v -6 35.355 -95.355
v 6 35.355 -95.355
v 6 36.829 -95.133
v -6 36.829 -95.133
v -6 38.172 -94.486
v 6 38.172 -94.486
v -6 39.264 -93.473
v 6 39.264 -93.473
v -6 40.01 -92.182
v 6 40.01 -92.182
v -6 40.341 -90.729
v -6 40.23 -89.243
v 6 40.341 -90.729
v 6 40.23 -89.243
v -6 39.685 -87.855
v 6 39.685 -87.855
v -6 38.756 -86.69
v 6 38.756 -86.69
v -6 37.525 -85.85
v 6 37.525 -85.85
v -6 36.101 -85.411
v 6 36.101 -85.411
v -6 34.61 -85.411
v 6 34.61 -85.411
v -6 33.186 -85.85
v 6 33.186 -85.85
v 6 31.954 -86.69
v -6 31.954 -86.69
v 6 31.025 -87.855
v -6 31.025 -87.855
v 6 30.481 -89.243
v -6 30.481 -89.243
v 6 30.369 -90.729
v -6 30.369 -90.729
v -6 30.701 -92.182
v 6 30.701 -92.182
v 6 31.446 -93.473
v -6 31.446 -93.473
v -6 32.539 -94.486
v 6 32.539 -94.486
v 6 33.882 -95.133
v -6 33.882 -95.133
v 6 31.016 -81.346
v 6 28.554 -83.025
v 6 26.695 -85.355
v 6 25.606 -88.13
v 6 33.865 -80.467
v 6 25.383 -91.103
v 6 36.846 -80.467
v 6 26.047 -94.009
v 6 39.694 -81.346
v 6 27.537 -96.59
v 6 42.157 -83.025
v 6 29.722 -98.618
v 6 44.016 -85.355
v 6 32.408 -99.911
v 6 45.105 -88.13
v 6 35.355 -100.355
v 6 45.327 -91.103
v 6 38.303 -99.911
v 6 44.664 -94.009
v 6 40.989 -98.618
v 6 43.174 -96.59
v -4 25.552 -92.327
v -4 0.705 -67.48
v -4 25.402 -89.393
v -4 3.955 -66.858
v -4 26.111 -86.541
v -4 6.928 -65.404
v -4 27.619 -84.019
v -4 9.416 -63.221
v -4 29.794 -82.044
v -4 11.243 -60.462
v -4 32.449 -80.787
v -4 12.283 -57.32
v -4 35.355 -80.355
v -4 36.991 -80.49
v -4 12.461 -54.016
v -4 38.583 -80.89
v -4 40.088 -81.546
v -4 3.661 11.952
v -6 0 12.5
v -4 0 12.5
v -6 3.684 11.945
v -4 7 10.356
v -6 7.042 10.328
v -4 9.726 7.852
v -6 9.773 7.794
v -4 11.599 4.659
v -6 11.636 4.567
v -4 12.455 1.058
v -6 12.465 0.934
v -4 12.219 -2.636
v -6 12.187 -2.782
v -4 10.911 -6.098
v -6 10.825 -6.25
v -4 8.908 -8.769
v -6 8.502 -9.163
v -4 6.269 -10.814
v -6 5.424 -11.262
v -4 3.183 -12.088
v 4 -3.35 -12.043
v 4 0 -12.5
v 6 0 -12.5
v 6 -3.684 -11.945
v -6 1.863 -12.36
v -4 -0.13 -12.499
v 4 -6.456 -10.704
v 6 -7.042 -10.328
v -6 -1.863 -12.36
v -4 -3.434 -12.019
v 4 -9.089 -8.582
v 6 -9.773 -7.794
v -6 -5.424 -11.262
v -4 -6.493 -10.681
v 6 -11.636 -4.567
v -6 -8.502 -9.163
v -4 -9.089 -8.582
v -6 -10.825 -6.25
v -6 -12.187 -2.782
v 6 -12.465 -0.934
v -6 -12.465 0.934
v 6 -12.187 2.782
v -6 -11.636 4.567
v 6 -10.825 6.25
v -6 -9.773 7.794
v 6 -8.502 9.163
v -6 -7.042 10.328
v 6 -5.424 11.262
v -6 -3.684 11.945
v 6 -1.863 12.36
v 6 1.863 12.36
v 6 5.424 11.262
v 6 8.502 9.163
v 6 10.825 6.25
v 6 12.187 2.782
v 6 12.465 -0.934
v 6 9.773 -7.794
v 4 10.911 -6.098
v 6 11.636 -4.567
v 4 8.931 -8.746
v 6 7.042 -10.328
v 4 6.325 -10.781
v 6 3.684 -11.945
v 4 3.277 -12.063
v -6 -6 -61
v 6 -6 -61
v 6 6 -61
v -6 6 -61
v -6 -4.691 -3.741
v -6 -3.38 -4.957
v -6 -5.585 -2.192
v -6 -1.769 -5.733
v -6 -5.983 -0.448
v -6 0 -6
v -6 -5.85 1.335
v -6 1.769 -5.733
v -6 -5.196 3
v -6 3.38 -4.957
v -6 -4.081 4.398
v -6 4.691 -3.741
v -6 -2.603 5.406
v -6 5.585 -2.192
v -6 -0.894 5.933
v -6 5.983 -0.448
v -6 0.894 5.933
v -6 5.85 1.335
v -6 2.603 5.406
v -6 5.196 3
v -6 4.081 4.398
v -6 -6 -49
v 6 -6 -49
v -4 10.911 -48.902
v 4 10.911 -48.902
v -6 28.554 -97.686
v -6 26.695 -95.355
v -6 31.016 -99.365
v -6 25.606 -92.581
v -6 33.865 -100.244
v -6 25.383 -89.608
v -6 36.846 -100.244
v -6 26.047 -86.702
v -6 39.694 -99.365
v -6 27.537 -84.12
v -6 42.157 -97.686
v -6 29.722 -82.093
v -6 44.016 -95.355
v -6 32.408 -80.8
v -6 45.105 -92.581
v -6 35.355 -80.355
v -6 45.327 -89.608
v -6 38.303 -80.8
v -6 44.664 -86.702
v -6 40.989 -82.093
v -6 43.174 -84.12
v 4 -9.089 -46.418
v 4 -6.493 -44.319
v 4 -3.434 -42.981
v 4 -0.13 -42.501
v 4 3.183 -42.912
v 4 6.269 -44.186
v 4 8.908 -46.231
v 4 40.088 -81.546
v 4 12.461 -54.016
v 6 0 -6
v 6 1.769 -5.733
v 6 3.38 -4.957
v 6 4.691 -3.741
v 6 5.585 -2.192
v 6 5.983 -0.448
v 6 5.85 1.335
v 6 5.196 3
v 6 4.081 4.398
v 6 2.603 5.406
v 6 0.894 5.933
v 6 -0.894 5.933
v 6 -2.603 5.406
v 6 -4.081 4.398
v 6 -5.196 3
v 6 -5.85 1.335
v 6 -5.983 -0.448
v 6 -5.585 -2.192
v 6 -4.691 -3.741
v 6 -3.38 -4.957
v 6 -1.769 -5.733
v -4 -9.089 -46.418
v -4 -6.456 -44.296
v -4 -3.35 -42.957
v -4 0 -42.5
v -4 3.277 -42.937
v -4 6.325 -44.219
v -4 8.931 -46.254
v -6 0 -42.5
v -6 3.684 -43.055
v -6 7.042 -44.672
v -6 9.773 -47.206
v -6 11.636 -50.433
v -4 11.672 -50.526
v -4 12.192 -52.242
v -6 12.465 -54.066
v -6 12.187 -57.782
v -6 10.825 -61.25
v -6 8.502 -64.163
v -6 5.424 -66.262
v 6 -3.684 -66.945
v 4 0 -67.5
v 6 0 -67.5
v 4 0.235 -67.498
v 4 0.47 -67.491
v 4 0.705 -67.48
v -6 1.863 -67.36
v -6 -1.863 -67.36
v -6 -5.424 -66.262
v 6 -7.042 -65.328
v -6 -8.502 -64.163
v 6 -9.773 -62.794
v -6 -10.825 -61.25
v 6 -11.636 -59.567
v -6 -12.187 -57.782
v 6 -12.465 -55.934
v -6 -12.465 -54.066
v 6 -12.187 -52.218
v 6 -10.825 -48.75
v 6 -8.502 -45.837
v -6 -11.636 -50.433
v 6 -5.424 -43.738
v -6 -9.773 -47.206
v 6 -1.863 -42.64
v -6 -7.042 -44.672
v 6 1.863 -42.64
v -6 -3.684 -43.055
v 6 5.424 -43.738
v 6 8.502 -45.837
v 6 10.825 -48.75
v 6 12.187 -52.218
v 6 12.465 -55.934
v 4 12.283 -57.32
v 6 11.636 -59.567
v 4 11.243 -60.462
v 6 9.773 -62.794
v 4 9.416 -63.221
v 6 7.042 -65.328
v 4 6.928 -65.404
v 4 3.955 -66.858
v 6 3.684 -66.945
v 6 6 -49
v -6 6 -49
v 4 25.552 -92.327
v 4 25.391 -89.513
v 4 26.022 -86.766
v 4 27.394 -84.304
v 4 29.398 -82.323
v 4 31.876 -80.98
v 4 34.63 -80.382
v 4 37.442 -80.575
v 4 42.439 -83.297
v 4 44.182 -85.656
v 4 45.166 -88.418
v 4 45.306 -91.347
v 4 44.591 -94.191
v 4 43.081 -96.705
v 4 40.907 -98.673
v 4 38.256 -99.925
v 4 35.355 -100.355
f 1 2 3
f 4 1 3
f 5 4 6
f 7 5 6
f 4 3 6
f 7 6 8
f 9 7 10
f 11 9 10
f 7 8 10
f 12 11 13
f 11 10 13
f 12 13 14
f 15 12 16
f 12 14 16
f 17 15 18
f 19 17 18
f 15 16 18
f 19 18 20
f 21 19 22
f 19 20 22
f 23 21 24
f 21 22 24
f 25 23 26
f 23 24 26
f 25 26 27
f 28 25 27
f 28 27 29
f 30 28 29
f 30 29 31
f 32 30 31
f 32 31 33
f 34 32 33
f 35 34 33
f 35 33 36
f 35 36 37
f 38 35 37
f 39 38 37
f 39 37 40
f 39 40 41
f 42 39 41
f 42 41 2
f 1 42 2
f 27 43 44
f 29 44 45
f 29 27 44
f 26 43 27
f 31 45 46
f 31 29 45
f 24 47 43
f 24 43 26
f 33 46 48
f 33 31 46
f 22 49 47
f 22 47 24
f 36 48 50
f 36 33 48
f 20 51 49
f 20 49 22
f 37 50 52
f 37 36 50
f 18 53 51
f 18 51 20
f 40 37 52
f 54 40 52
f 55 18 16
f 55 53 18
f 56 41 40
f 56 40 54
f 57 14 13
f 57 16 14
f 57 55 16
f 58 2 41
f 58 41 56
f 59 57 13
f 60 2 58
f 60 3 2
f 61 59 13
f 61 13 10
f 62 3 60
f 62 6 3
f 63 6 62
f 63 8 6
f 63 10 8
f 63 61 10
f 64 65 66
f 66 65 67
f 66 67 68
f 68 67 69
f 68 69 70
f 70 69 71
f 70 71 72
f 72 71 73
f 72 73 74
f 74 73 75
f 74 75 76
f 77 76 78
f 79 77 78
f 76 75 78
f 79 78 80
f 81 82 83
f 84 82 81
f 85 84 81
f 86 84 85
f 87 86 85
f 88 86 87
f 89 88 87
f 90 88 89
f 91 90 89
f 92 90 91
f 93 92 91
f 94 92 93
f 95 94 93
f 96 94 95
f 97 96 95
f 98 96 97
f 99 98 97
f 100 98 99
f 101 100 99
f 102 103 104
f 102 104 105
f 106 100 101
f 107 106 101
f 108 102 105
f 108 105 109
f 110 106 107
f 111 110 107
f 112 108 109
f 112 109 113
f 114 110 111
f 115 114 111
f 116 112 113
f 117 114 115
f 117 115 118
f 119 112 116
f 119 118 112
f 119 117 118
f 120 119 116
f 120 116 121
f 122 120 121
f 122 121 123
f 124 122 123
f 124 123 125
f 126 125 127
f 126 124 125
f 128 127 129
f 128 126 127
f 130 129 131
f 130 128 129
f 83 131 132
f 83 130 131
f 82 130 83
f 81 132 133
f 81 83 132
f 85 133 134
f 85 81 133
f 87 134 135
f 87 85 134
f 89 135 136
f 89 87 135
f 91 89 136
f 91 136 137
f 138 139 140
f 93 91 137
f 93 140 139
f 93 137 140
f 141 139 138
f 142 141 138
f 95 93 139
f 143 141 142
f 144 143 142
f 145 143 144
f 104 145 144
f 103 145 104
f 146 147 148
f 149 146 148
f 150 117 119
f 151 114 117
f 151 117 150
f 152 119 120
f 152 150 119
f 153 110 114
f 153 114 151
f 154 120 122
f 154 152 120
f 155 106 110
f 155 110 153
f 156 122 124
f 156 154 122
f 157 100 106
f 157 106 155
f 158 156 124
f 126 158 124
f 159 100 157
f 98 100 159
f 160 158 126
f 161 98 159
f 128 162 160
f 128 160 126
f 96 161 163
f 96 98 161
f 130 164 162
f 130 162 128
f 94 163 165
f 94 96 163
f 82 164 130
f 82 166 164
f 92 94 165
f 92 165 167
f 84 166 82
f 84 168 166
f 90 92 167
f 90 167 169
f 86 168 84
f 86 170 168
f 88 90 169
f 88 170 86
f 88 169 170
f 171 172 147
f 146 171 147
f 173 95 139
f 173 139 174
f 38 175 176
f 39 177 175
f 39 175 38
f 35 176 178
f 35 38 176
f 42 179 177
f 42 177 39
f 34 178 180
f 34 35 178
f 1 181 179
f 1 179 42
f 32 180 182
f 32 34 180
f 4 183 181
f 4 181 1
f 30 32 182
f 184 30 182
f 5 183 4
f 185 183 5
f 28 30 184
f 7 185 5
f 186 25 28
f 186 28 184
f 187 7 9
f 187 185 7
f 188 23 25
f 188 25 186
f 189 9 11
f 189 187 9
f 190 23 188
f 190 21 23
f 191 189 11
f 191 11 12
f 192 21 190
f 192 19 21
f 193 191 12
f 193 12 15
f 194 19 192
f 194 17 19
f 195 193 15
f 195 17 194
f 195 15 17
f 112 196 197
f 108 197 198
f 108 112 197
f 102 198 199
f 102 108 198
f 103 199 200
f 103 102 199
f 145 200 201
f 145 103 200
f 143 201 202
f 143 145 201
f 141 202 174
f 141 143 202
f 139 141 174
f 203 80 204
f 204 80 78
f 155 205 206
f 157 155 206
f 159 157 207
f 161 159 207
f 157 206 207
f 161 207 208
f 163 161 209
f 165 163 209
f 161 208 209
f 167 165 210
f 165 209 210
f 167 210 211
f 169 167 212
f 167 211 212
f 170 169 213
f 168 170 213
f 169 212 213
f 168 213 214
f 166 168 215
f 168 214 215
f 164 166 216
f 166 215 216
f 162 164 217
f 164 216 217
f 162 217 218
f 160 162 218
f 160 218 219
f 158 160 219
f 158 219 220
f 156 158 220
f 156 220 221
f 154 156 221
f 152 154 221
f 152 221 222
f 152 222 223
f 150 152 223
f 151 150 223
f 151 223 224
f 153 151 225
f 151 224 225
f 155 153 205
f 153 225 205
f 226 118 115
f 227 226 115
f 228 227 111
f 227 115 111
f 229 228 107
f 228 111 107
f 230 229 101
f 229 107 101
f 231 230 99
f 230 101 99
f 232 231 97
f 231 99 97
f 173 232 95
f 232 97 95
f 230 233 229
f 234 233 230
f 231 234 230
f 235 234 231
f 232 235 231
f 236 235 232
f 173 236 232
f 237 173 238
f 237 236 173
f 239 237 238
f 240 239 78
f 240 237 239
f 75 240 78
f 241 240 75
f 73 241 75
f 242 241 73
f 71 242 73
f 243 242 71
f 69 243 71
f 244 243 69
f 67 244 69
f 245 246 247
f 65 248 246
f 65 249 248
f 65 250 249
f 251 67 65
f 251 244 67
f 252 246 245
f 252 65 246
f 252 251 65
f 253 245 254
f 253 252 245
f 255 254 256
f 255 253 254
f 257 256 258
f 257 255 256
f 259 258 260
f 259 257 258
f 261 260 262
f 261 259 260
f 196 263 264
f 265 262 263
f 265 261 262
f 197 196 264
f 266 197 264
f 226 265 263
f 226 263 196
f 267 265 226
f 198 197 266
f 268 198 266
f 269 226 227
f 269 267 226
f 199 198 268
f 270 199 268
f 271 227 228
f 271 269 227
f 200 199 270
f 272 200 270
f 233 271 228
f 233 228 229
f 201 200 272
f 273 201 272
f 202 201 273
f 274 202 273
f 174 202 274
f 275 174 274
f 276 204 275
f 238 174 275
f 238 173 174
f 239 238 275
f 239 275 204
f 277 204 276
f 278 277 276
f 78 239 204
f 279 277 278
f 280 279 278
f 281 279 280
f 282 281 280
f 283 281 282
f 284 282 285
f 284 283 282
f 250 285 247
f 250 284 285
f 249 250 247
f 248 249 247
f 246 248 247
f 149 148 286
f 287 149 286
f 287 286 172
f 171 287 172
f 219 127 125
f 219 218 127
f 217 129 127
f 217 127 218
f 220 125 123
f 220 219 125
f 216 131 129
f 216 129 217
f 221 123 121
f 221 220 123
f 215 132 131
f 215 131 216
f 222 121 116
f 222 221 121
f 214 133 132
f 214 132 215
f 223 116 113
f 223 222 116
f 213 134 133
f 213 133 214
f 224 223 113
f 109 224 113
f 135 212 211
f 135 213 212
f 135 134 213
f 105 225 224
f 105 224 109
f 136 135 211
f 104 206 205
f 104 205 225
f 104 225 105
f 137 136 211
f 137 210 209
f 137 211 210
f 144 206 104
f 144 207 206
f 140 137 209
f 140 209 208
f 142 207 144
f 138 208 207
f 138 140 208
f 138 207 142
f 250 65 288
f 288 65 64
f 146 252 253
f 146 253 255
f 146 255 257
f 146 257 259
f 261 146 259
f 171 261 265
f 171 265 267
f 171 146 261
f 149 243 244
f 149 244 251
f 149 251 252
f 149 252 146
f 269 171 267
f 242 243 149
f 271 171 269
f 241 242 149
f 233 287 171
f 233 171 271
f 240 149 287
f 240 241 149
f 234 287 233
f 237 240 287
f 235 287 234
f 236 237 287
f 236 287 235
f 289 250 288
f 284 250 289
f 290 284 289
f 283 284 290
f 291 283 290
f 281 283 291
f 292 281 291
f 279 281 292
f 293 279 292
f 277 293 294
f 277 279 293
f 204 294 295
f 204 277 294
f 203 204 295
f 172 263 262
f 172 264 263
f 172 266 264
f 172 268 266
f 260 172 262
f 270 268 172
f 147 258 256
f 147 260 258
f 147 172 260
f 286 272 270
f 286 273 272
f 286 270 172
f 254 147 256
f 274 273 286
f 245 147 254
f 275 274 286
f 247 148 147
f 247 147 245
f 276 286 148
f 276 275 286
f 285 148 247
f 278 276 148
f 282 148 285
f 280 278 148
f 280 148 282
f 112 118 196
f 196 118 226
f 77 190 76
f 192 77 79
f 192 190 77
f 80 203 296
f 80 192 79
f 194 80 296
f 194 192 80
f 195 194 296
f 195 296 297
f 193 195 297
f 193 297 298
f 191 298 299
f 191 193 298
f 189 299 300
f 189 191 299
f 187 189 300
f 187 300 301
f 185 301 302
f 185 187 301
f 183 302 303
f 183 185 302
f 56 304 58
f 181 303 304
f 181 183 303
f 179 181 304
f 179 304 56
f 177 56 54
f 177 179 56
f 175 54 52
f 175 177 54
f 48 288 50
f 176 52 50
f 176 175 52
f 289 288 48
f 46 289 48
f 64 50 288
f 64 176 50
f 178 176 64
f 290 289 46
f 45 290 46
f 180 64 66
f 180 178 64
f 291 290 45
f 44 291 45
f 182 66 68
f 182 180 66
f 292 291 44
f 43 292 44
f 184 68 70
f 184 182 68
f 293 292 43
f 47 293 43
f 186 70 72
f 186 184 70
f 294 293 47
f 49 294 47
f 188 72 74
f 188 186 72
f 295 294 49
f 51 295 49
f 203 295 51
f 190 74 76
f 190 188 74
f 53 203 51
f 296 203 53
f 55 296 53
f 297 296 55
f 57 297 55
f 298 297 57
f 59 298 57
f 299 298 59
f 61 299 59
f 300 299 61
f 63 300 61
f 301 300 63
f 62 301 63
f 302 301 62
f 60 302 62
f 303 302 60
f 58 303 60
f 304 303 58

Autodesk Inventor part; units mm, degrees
ref_plane "YZ Plane" through (0, 0, 0) normal (1, 0, 0) x (0, 1, 0)
ref_plane "XZ Plane" through (0, 0, 0) normal (0, 1, 0) x (-1, 0, 0)
ref_plane "XY Plane" through (0, 0, 0) normal (0, 0, 1) x (1, 0, 0)
sketch "Sketch1" plane through (0, 0, 0) normal (1, 0, 0) x (0, 1, 0)
  circle A0 centre (0, 0) radius 12.5
  line L0 (0, 0) -> (0, -55) construction
  circle A1 centre (0, -55) radius 12.5
  line L1 (0, -55) -> (35.3553, -90.3553) construction
  circle A2 centre (35.3553, -90.3553) radius 10
  line L2 (10.9114, -6.0985) -> (10.9114, -48.9015)
  line L3 (-9.0886, -8.5818) -> (-9.0886, -46.4182)
  line L4 (40.0876, -81.5459) -> (12.4612, -54.0158)
  line L5 (0.7049, -67.4801) -> (25.5516, -92.3268)
  dimension "d0" = 25
  dimension "d1" = 55
  dimension "d2" = 25
  dimension "d3" = 50
  dimension "d4" = 20
  dimension "d5" = 20
  dimension "d7" = 45
  dimension "d8" = 0.1
extrude "Extrusion1" add sketch "Sketch1" along normal mid plane 8
sketch "Sketch2" plane through (4, 0, 0) normal (1, 0, 0) x (0, 0, -1)
  circle A0 centre (0, 0) radius 12.5
  line L0 (0, 0) -> (55, 0) construction
  circle A1 centre (55, 0) radius 12.5
  line L1 (55, 0) -> (90.3553, 35.3553)
  circle A2 centre (90.3553, 35.3553) radius 10
  dimension "d11" = 25
  dimension "d12" = 55
  dimension "d13" = 25
  dimension "d14" = 50
  dimension "d15" = 45
  dimension "d16" = 20
extrude "Extrusion2" add sketch "Sketch2" along normal blind 2
sketch "Sketch3" plane through (-4, 0, 0) normal (-1, 0, 0) x (0, 0, 1)
  line L0 (0, 0) -> (-55, 0) construction
  line L1 (-55, 0) -> (-90.3553, 35.3553) construction
  circle A0 centre (-90.3553, 35.3553) radius 10
  circle A1 centre (-55, 0) radius 12.5
  circle A2 centre (0, 0) radius 12.5
  dimension "d19" = 55
  dimension "d20" = 50
  dimension "d21" = 45
  dimension "d22" = 20
  dimension "d23" = 25
  dimension "d24" = 25
extrude "Extrusion3" add sketch "Sketch3" along normal blind 2
sketch "Sketch4" plane through (6, 0, 0) normal (1, 0, 0) x (0, 0, -1)
  circle A0 centre (0, 0) radius 6
  line L0 (0, 0) -> (55, 0) construction
  line L1 (55, 0) -> (90.3553, 35.3553) construction
  line L2 (49, -6) -> (61, -6)
  line L3 (61, -6) -> (61, 6)
  line L4 (61, 6) -> (49, 6)
  line L5 (49, 6) -> (49, -6)
  line L6 (49, -6) -> (61, 6) construction
  line L7 (61, -6) -> (49, 6) construction
  circle A1 centre (90.3553, 35.3553) radius 5
  dimension "d27" = 12
  dimension "d28" = 55
  dimension "d29" = 50
  dimension "d30" = 45
  dimension "d31" = 12
  dimension "d32" = 12
  dimension "d33" = 10
extrude "Extrusion4" cut sketch "Sketch4" against normal through all
